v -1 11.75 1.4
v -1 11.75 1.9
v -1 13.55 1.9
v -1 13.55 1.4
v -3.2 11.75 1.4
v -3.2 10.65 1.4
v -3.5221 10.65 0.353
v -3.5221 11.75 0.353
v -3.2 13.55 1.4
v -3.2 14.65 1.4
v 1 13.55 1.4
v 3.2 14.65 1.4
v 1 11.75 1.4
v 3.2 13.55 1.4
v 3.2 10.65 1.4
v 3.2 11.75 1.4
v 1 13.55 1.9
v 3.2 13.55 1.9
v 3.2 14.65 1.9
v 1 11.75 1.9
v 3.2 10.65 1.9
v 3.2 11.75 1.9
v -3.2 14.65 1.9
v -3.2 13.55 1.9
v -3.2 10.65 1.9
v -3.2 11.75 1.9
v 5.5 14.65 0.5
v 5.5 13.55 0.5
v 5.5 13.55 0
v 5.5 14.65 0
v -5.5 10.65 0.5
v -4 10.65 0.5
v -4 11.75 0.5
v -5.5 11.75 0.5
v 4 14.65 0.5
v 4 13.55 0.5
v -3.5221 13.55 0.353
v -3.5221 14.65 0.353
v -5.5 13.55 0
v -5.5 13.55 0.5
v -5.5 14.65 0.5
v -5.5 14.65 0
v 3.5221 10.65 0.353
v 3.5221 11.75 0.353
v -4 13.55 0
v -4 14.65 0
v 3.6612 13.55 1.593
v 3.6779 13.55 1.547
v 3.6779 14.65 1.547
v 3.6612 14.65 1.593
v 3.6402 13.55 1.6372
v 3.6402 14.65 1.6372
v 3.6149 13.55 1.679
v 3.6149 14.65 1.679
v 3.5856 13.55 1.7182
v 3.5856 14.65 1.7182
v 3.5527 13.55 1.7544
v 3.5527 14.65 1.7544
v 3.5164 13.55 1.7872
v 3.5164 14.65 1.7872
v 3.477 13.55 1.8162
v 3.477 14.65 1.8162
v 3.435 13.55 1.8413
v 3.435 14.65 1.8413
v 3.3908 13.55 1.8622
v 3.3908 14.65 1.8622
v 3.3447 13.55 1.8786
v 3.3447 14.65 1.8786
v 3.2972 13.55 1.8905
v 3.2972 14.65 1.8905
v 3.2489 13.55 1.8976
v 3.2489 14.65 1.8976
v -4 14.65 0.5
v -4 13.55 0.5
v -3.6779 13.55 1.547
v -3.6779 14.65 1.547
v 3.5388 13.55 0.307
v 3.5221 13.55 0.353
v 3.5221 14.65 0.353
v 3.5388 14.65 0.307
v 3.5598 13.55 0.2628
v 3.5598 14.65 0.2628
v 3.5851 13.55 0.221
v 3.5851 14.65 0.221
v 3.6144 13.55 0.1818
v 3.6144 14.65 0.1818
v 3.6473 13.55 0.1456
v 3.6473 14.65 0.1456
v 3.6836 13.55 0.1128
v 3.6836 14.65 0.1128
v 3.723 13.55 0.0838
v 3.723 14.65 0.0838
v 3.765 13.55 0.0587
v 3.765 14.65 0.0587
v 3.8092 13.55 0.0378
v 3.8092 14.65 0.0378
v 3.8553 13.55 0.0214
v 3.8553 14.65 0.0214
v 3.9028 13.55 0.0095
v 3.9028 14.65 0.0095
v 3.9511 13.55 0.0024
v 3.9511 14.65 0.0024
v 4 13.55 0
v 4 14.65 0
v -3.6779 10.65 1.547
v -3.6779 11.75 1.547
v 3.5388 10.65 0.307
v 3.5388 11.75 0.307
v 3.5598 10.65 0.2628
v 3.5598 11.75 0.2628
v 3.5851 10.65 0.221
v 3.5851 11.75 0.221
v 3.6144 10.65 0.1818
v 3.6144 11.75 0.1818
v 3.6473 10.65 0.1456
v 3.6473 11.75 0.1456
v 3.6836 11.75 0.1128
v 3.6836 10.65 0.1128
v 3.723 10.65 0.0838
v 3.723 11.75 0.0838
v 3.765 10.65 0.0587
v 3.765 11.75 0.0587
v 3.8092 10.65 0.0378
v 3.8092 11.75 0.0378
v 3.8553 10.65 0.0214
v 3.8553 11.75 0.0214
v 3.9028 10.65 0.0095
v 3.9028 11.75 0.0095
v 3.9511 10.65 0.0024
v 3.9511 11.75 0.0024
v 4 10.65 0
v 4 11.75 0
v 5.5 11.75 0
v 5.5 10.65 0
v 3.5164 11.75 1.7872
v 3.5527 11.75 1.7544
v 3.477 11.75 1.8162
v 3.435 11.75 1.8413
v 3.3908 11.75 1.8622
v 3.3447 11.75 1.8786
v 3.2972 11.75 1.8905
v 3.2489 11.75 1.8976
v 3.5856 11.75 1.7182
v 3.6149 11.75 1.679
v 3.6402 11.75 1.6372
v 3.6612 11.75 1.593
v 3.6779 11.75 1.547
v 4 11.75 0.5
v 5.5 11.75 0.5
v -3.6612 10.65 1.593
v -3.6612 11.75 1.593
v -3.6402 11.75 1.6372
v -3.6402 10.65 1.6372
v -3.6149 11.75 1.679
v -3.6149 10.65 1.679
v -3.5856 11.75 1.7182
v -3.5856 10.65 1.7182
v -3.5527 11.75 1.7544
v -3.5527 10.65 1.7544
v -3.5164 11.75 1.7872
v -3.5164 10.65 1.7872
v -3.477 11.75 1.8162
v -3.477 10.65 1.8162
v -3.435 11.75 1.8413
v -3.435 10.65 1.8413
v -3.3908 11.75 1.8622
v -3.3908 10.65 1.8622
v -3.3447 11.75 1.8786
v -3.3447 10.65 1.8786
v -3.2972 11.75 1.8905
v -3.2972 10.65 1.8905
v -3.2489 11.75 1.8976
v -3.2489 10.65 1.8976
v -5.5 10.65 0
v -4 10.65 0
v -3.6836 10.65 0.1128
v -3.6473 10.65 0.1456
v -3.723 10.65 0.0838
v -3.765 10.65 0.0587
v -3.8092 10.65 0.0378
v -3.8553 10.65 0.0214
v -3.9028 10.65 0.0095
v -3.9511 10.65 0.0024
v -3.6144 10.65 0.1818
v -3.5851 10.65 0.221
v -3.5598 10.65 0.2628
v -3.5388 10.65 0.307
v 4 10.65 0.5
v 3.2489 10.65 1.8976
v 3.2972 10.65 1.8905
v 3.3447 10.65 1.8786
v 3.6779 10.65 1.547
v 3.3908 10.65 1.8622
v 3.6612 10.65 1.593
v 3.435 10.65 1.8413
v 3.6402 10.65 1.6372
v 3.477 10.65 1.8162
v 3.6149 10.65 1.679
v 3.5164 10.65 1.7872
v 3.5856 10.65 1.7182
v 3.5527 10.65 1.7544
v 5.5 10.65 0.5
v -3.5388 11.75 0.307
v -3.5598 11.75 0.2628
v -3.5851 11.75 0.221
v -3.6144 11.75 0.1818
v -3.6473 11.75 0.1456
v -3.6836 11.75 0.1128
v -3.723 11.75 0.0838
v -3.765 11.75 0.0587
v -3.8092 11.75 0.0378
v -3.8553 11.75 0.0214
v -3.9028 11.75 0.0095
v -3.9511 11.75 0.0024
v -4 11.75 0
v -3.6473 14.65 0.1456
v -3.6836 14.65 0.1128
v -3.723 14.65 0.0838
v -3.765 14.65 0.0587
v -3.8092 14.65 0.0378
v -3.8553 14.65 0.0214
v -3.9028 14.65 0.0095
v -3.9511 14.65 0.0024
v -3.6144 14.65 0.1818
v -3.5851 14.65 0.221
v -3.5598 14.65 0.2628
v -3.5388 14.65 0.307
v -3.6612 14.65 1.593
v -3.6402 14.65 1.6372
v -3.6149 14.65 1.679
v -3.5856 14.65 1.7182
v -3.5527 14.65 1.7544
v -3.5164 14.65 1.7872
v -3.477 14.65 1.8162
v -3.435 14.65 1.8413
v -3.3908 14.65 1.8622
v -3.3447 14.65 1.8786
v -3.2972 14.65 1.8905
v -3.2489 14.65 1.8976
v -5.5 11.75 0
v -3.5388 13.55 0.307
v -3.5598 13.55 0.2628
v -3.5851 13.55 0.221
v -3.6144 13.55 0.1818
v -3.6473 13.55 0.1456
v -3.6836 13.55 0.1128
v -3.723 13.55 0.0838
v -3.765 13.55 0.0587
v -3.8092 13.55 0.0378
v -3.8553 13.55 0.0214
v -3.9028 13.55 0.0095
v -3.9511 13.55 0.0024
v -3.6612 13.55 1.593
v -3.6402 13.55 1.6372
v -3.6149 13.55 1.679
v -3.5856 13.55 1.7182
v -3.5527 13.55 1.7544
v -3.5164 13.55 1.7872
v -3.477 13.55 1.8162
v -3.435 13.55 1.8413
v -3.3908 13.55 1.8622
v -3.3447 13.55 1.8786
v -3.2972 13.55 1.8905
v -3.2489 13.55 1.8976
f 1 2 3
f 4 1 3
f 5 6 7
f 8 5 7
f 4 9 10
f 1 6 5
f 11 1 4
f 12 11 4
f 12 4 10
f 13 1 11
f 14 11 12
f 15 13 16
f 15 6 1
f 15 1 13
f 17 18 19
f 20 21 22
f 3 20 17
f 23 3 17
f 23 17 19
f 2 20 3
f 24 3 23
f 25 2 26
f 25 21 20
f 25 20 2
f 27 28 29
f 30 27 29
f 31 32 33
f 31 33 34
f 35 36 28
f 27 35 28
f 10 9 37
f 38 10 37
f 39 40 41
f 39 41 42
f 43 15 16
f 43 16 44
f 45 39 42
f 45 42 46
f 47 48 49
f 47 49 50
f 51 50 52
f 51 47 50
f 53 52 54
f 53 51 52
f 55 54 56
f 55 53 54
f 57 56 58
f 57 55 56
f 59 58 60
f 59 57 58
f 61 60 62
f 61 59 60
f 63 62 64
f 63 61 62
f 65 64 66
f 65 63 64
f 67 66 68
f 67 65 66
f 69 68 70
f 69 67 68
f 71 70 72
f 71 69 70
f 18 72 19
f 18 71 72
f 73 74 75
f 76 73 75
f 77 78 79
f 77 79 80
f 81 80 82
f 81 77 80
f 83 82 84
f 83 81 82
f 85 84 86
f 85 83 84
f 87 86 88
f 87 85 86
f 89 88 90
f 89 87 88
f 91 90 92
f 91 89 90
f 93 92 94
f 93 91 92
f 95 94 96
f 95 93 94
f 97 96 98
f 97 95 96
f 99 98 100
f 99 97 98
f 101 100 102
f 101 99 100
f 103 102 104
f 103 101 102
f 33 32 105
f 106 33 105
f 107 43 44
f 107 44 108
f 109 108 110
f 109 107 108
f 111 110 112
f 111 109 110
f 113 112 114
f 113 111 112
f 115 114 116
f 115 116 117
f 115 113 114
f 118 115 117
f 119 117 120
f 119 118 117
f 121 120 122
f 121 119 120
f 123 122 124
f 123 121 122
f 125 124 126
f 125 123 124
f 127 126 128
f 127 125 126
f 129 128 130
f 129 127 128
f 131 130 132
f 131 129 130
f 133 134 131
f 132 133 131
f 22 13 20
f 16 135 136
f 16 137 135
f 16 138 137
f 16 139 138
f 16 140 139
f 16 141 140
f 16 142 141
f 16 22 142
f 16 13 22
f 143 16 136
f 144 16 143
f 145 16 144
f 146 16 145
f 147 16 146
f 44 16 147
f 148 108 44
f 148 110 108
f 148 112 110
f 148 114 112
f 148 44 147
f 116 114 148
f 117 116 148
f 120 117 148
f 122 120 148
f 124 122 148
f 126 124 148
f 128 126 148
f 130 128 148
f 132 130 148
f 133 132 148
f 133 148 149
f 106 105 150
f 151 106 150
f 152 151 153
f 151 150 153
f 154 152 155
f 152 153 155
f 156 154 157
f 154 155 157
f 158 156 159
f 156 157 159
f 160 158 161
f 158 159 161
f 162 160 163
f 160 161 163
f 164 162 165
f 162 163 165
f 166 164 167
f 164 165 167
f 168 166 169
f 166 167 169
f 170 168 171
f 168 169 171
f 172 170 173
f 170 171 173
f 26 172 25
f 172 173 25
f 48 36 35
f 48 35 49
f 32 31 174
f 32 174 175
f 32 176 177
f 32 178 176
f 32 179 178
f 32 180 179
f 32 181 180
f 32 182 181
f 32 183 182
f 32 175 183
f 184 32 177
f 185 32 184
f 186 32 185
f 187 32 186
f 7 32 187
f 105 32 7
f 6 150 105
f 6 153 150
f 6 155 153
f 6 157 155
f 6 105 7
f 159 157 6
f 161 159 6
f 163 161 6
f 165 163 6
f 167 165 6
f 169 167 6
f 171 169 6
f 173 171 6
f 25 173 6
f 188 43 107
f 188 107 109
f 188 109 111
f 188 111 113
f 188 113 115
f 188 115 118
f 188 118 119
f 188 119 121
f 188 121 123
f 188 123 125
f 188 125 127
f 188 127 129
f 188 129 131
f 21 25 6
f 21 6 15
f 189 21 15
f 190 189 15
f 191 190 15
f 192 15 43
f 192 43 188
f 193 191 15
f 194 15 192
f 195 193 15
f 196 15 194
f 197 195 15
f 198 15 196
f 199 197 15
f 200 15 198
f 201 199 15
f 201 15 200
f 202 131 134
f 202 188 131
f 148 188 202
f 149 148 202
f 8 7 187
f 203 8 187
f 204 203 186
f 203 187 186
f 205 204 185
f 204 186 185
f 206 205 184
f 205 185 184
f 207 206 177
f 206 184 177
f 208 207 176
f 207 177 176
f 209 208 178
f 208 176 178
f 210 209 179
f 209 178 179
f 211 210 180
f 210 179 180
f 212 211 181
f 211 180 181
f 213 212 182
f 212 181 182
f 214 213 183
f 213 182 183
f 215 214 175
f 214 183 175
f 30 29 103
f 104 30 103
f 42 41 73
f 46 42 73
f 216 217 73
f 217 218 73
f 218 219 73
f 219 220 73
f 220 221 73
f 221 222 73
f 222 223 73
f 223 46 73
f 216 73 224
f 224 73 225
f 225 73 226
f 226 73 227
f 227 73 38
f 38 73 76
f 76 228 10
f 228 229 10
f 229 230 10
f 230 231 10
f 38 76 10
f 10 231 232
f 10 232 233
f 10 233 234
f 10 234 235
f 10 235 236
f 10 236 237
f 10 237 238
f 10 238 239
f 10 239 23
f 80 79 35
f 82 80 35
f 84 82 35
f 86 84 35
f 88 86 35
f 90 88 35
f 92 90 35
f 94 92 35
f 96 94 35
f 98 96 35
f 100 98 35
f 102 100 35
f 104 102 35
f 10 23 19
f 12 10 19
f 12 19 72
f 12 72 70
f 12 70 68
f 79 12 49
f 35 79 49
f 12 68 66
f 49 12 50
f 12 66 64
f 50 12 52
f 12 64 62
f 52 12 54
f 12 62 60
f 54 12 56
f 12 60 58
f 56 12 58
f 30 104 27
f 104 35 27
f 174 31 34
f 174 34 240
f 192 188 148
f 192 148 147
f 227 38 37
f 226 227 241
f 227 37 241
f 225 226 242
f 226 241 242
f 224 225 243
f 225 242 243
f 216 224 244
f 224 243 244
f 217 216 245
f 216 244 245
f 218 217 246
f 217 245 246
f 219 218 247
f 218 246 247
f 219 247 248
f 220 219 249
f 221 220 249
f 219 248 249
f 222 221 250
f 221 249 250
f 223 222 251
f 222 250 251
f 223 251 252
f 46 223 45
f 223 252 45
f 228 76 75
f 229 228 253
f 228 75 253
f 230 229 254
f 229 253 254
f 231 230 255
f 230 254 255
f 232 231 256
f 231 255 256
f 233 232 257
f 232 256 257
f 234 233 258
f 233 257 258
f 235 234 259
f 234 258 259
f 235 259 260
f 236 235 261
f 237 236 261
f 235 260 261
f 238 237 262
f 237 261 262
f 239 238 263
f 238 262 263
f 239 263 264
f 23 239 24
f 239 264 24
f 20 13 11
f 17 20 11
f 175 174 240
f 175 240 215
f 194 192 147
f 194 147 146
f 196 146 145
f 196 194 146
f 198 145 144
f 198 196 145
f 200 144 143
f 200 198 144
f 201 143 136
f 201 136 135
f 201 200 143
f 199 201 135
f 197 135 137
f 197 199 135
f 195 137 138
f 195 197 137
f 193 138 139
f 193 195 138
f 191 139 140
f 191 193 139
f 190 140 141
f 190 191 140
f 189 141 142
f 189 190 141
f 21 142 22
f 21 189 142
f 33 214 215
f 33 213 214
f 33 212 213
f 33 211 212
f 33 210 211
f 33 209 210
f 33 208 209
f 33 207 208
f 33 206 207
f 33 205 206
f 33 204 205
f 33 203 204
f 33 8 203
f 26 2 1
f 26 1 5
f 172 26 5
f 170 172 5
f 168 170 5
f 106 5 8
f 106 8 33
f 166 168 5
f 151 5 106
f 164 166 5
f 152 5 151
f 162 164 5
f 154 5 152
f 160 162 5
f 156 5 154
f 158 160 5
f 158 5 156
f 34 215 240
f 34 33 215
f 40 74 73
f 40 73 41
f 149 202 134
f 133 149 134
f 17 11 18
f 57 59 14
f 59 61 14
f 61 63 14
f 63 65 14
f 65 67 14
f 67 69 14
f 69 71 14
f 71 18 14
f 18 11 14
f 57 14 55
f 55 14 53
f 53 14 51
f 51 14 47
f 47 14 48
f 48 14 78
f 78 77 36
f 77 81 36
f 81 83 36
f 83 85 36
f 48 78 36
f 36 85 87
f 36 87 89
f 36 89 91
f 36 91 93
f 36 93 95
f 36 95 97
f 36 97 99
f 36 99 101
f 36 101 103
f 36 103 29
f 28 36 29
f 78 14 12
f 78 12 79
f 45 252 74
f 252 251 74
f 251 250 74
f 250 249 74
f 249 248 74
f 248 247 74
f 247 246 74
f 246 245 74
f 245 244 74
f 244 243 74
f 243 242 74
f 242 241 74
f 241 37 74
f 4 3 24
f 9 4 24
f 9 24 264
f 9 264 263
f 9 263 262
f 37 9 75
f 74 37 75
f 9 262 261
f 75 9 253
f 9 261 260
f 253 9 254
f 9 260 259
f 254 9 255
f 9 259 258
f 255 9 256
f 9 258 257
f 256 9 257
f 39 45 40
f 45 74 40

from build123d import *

# Parameters (mm, degrees)
PAD024_DEPTH         = 2
SKETCH118_W          = 5
SKETCH118_H          = 1.8
POCKET028_DEPTH      = 23.716818
POCKET028_DEPTH_BACK = 25.616818


with BuildPart() as part:
    # Sketch119 → Pad024 (new body, symmetric)
    with BuildSketch(Plane.XZ):
        with BuildLine():
            Line((0, 1.9), (3.2, 1.9))
            ThreePointArc((3.677897, 1.547019), (3.497061, 1.802188), (3.2, 1.9))
            Line((4, 0.5), (3.677897, 1.547019))
            Line((4, 0.5), (5.5, 0.5))
            Line((5.5, 0.5), (5.5, 0))
            Line((5.5, 0), (4, 0))
            ThreePointArc((3.522103, 0.352981), (3.702939, 0.097812), (4, 0))
            Line((3.2, 1.4), (3.522103, 0.352981))
            Line((3.2, 1.4), (0, 1.4))
            Line((0, 1.4), (0, 1.9))
        make_face()
    pad024 = extrude(amount=PAD024_DEPTH, both=True)

    # Mirrored020: Pad024 across YZ
    add(pad024.mirror(Plane.YZ))

    # Sketch118 → Pocket028 (cut, two sides)
    with BuildSketch(Plane.XY) as pocket028_sk:
        with Locations((3.5, 0)):
            Rectangle(SKETCH118_W, SKETCH118_H)
    pocket028 = extrude(amount=-POCKET028_DEPTH, mode=Mode.SUBTRACT) + extrude(pocket028_sk.sketch, amount=POCKET028_DEPTH_BACK, mode=Mode.SUBTRACT)

    # Mirrored003: Pocket028 across YZ
    add(pocket028.mirror(Plane.YZ), mode=Mode.SUBTRACT)


with BuildPart() as part_1:
    # Body033 placement: moved
    add(part.part.moved(Location((0, 12.65, 0))))


solid = part_1.part
